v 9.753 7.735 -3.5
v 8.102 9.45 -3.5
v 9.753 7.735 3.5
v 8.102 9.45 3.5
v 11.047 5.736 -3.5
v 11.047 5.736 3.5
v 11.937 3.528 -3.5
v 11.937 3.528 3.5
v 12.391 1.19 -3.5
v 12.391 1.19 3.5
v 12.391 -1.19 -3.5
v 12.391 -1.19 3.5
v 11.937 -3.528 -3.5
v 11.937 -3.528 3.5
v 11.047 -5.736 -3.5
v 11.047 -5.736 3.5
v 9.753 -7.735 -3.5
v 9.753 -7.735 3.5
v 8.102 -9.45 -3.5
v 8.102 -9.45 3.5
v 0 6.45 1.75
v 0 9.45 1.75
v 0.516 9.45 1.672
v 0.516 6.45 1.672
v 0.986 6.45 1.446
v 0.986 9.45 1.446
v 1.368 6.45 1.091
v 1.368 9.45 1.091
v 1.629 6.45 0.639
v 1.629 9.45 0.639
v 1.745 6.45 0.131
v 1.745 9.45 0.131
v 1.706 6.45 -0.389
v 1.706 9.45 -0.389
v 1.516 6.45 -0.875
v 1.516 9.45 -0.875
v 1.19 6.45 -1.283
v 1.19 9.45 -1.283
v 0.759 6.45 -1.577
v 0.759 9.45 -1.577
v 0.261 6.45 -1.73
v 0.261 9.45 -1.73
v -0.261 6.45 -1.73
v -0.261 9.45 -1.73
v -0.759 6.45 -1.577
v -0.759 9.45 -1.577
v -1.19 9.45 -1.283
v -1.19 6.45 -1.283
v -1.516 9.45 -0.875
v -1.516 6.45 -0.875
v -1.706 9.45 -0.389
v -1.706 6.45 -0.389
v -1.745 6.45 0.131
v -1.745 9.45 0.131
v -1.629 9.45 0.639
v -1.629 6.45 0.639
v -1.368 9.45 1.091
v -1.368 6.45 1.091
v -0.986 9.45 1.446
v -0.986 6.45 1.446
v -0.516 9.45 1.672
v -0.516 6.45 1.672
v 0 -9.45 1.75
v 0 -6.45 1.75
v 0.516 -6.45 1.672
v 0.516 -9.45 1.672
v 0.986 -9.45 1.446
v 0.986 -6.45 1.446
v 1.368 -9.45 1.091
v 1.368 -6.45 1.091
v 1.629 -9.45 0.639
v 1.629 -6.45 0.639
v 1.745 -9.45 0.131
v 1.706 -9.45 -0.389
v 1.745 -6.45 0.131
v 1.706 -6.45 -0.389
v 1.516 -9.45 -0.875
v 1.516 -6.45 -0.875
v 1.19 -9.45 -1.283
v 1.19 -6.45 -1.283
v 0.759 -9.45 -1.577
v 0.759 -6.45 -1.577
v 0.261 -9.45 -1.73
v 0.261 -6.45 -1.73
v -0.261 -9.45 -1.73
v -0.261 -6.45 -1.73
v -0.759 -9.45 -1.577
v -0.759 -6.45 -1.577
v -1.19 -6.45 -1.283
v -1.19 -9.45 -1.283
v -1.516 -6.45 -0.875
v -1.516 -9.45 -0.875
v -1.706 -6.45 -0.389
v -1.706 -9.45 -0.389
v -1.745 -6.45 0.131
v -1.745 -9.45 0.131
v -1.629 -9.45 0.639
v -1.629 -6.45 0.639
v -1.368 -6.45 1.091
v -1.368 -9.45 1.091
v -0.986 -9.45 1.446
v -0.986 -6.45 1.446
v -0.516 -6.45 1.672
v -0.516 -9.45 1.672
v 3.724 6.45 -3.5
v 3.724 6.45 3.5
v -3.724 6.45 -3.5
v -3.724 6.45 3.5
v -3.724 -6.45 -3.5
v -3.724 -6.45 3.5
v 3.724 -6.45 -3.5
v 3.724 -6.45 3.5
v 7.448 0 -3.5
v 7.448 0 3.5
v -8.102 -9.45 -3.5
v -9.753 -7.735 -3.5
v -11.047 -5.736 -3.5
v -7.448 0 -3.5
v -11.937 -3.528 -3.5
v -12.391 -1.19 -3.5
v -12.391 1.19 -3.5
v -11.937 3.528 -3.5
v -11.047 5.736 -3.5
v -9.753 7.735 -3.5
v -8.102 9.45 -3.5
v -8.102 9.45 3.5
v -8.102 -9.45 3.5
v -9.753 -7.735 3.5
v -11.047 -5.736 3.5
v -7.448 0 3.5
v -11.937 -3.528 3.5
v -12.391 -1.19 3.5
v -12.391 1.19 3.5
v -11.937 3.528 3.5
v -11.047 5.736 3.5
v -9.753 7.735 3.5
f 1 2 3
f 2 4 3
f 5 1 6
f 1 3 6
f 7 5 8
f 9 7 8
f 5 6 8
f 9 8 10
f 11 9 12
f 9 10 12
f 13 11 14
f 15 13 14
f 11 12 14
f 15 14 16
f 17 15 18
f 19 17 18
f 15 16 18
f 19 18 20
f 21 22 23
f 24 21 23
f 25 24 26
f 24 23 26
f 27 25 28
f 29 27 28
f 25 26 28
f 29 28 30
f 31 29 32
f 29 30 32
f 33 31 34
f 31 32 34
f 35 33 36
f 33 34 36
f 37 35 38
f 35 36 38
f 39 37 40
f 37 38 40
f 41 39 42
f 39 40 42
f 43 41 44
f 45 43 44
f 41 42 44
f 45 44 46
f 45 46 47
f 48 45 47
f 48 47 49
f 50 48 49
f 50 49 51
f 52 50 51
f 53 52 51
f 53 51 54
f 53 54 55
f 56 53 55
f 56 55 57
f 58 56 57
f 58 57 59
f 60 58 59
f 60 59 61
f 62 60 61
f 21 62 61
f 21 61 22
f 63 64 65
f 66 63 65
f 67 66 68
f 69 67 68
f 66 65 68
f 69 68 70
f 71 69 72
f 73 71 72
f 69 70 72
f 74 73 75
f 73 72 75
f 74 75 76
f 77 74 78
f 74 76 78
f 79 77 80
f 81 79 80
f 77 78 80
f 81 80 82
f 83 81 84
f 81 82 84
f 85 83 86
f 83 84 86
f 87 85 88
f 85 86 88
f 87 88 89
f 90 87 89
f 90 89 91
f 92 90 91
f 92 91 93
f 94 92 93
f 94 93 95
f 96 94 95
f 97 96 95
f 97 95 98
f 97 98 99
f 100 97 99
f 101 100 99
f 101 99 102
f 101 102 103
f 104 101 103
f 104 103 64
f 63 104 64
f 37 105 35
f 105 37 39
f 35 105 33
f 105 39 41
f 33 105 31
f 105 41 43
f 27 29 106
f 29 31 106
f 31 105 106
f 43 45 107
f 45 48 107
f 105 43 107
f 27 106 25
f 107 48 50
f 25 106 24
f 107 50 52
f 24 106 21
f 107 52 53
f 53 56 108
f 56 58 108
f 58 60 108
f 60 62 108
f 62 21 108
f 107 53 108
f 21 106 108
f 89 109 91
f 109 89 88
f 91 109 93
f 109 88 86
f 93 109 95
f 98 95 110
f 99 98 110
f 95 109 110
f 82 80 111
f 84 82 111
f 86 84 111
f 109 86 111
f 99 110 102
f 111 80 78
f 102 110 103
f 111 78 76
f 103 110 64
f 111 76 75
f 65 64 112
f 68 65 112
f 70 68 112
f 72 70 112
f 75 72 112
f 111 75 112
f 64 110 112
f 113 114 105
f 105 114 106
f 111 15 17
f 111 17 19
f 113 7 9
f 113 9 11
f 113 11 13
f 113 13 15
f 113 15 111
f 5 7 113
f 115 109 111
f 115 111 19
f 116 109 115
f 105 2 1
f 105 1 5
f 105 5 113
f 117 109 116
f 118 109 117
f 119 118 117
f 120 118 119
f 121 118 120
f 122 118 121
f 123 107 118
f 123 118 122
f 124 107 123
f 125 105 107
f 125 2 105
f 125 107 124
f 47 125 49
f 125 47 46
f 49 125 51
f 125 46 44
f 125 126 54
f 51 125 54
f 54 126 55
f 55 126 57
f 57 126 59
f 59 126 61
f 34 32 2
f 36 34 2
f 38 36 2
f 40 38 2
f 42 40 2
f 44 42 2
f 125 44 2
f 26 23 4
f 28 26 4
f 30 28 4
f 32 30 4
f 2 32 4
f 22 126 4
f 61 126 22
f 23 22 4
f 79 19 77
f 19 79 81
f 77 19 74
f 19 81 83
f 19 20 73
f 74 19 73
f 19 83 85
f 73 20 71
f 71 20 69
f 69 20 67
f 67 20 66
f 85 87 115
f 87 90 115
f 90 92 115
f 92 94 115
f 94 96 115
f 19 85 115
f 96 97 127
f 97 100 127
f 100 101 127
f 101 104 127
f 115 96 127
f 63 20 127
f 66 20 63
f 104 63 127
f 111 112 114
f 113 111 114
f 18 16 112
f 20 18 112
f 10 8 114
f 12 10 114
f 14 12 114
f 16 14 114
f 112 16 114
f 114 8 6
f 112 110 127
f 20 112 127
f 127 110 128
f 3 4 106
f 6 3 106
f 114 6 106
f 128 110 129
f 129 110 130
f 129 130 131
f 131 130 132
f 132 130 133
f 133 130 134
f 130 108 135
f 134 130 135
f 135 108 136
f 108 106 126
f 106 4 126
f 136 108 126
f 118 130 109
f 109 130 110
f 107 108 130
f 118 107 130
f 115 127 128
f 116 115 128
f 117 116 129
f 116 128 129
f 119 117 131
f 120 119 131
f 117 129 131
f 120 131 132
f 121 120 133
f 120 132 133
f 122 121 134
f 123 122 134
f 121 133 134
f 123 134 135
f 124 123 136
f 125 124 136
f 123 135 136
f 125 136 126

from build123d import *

# Parameters (mm, degrees)
BOSS_EXTRUDE1_DEPTH = 3.5
SKETCH2_R           = 1.75
CUT_EXTRUDE1_DEPTH  = 23.899960365


with BuildPart() as part:
    # Sketch1 → Boss-Extrude1 (new, symmetric)
    with BuildSketch(Plane.XY):
        with BuildLine():
            Line((-8.102202461, 9.45), (8.102202461, 9.45))
            ThreePointArc((8.102202461, 9.45), (12.447818473, 0), (8.102202461, -9.45))
            Line((8.102202461, -9.45), (-8.102202461, -9.45))
            ThreePointArc((-8.102202461, -9.45), (-12.447818473, 0), (-8.102202461, 9.45))
        make_face()
        Polygon((7.447818473, 0), (3.723909236, 6.45), (-3.723909236, 6.45), (-7.447818473, 0), (-3.723909236, -6.45), (3.723909236, -6.45), align=None, mode=Mode.SUBTRACT)
    extrude(amount=BOSS_EXTRUDE1_DEPTH, both=True)

    # Sketch2 → Cut-Extrude1 (cut, through all)
    with BuildSketch(Plane(origin=(0, 9.45, 0), x_dir=(1, 0, 0), z_dir=(0, 1, 0))):
        with Locations(Location((0, 0, 0), (0, 0, 270))):
            Circle(SKETCH2_R)
    extrude(amount=-CUT_EXTRUDE1_DEPTH, mode=Mode.SUBTRACT)


solid = part.part
